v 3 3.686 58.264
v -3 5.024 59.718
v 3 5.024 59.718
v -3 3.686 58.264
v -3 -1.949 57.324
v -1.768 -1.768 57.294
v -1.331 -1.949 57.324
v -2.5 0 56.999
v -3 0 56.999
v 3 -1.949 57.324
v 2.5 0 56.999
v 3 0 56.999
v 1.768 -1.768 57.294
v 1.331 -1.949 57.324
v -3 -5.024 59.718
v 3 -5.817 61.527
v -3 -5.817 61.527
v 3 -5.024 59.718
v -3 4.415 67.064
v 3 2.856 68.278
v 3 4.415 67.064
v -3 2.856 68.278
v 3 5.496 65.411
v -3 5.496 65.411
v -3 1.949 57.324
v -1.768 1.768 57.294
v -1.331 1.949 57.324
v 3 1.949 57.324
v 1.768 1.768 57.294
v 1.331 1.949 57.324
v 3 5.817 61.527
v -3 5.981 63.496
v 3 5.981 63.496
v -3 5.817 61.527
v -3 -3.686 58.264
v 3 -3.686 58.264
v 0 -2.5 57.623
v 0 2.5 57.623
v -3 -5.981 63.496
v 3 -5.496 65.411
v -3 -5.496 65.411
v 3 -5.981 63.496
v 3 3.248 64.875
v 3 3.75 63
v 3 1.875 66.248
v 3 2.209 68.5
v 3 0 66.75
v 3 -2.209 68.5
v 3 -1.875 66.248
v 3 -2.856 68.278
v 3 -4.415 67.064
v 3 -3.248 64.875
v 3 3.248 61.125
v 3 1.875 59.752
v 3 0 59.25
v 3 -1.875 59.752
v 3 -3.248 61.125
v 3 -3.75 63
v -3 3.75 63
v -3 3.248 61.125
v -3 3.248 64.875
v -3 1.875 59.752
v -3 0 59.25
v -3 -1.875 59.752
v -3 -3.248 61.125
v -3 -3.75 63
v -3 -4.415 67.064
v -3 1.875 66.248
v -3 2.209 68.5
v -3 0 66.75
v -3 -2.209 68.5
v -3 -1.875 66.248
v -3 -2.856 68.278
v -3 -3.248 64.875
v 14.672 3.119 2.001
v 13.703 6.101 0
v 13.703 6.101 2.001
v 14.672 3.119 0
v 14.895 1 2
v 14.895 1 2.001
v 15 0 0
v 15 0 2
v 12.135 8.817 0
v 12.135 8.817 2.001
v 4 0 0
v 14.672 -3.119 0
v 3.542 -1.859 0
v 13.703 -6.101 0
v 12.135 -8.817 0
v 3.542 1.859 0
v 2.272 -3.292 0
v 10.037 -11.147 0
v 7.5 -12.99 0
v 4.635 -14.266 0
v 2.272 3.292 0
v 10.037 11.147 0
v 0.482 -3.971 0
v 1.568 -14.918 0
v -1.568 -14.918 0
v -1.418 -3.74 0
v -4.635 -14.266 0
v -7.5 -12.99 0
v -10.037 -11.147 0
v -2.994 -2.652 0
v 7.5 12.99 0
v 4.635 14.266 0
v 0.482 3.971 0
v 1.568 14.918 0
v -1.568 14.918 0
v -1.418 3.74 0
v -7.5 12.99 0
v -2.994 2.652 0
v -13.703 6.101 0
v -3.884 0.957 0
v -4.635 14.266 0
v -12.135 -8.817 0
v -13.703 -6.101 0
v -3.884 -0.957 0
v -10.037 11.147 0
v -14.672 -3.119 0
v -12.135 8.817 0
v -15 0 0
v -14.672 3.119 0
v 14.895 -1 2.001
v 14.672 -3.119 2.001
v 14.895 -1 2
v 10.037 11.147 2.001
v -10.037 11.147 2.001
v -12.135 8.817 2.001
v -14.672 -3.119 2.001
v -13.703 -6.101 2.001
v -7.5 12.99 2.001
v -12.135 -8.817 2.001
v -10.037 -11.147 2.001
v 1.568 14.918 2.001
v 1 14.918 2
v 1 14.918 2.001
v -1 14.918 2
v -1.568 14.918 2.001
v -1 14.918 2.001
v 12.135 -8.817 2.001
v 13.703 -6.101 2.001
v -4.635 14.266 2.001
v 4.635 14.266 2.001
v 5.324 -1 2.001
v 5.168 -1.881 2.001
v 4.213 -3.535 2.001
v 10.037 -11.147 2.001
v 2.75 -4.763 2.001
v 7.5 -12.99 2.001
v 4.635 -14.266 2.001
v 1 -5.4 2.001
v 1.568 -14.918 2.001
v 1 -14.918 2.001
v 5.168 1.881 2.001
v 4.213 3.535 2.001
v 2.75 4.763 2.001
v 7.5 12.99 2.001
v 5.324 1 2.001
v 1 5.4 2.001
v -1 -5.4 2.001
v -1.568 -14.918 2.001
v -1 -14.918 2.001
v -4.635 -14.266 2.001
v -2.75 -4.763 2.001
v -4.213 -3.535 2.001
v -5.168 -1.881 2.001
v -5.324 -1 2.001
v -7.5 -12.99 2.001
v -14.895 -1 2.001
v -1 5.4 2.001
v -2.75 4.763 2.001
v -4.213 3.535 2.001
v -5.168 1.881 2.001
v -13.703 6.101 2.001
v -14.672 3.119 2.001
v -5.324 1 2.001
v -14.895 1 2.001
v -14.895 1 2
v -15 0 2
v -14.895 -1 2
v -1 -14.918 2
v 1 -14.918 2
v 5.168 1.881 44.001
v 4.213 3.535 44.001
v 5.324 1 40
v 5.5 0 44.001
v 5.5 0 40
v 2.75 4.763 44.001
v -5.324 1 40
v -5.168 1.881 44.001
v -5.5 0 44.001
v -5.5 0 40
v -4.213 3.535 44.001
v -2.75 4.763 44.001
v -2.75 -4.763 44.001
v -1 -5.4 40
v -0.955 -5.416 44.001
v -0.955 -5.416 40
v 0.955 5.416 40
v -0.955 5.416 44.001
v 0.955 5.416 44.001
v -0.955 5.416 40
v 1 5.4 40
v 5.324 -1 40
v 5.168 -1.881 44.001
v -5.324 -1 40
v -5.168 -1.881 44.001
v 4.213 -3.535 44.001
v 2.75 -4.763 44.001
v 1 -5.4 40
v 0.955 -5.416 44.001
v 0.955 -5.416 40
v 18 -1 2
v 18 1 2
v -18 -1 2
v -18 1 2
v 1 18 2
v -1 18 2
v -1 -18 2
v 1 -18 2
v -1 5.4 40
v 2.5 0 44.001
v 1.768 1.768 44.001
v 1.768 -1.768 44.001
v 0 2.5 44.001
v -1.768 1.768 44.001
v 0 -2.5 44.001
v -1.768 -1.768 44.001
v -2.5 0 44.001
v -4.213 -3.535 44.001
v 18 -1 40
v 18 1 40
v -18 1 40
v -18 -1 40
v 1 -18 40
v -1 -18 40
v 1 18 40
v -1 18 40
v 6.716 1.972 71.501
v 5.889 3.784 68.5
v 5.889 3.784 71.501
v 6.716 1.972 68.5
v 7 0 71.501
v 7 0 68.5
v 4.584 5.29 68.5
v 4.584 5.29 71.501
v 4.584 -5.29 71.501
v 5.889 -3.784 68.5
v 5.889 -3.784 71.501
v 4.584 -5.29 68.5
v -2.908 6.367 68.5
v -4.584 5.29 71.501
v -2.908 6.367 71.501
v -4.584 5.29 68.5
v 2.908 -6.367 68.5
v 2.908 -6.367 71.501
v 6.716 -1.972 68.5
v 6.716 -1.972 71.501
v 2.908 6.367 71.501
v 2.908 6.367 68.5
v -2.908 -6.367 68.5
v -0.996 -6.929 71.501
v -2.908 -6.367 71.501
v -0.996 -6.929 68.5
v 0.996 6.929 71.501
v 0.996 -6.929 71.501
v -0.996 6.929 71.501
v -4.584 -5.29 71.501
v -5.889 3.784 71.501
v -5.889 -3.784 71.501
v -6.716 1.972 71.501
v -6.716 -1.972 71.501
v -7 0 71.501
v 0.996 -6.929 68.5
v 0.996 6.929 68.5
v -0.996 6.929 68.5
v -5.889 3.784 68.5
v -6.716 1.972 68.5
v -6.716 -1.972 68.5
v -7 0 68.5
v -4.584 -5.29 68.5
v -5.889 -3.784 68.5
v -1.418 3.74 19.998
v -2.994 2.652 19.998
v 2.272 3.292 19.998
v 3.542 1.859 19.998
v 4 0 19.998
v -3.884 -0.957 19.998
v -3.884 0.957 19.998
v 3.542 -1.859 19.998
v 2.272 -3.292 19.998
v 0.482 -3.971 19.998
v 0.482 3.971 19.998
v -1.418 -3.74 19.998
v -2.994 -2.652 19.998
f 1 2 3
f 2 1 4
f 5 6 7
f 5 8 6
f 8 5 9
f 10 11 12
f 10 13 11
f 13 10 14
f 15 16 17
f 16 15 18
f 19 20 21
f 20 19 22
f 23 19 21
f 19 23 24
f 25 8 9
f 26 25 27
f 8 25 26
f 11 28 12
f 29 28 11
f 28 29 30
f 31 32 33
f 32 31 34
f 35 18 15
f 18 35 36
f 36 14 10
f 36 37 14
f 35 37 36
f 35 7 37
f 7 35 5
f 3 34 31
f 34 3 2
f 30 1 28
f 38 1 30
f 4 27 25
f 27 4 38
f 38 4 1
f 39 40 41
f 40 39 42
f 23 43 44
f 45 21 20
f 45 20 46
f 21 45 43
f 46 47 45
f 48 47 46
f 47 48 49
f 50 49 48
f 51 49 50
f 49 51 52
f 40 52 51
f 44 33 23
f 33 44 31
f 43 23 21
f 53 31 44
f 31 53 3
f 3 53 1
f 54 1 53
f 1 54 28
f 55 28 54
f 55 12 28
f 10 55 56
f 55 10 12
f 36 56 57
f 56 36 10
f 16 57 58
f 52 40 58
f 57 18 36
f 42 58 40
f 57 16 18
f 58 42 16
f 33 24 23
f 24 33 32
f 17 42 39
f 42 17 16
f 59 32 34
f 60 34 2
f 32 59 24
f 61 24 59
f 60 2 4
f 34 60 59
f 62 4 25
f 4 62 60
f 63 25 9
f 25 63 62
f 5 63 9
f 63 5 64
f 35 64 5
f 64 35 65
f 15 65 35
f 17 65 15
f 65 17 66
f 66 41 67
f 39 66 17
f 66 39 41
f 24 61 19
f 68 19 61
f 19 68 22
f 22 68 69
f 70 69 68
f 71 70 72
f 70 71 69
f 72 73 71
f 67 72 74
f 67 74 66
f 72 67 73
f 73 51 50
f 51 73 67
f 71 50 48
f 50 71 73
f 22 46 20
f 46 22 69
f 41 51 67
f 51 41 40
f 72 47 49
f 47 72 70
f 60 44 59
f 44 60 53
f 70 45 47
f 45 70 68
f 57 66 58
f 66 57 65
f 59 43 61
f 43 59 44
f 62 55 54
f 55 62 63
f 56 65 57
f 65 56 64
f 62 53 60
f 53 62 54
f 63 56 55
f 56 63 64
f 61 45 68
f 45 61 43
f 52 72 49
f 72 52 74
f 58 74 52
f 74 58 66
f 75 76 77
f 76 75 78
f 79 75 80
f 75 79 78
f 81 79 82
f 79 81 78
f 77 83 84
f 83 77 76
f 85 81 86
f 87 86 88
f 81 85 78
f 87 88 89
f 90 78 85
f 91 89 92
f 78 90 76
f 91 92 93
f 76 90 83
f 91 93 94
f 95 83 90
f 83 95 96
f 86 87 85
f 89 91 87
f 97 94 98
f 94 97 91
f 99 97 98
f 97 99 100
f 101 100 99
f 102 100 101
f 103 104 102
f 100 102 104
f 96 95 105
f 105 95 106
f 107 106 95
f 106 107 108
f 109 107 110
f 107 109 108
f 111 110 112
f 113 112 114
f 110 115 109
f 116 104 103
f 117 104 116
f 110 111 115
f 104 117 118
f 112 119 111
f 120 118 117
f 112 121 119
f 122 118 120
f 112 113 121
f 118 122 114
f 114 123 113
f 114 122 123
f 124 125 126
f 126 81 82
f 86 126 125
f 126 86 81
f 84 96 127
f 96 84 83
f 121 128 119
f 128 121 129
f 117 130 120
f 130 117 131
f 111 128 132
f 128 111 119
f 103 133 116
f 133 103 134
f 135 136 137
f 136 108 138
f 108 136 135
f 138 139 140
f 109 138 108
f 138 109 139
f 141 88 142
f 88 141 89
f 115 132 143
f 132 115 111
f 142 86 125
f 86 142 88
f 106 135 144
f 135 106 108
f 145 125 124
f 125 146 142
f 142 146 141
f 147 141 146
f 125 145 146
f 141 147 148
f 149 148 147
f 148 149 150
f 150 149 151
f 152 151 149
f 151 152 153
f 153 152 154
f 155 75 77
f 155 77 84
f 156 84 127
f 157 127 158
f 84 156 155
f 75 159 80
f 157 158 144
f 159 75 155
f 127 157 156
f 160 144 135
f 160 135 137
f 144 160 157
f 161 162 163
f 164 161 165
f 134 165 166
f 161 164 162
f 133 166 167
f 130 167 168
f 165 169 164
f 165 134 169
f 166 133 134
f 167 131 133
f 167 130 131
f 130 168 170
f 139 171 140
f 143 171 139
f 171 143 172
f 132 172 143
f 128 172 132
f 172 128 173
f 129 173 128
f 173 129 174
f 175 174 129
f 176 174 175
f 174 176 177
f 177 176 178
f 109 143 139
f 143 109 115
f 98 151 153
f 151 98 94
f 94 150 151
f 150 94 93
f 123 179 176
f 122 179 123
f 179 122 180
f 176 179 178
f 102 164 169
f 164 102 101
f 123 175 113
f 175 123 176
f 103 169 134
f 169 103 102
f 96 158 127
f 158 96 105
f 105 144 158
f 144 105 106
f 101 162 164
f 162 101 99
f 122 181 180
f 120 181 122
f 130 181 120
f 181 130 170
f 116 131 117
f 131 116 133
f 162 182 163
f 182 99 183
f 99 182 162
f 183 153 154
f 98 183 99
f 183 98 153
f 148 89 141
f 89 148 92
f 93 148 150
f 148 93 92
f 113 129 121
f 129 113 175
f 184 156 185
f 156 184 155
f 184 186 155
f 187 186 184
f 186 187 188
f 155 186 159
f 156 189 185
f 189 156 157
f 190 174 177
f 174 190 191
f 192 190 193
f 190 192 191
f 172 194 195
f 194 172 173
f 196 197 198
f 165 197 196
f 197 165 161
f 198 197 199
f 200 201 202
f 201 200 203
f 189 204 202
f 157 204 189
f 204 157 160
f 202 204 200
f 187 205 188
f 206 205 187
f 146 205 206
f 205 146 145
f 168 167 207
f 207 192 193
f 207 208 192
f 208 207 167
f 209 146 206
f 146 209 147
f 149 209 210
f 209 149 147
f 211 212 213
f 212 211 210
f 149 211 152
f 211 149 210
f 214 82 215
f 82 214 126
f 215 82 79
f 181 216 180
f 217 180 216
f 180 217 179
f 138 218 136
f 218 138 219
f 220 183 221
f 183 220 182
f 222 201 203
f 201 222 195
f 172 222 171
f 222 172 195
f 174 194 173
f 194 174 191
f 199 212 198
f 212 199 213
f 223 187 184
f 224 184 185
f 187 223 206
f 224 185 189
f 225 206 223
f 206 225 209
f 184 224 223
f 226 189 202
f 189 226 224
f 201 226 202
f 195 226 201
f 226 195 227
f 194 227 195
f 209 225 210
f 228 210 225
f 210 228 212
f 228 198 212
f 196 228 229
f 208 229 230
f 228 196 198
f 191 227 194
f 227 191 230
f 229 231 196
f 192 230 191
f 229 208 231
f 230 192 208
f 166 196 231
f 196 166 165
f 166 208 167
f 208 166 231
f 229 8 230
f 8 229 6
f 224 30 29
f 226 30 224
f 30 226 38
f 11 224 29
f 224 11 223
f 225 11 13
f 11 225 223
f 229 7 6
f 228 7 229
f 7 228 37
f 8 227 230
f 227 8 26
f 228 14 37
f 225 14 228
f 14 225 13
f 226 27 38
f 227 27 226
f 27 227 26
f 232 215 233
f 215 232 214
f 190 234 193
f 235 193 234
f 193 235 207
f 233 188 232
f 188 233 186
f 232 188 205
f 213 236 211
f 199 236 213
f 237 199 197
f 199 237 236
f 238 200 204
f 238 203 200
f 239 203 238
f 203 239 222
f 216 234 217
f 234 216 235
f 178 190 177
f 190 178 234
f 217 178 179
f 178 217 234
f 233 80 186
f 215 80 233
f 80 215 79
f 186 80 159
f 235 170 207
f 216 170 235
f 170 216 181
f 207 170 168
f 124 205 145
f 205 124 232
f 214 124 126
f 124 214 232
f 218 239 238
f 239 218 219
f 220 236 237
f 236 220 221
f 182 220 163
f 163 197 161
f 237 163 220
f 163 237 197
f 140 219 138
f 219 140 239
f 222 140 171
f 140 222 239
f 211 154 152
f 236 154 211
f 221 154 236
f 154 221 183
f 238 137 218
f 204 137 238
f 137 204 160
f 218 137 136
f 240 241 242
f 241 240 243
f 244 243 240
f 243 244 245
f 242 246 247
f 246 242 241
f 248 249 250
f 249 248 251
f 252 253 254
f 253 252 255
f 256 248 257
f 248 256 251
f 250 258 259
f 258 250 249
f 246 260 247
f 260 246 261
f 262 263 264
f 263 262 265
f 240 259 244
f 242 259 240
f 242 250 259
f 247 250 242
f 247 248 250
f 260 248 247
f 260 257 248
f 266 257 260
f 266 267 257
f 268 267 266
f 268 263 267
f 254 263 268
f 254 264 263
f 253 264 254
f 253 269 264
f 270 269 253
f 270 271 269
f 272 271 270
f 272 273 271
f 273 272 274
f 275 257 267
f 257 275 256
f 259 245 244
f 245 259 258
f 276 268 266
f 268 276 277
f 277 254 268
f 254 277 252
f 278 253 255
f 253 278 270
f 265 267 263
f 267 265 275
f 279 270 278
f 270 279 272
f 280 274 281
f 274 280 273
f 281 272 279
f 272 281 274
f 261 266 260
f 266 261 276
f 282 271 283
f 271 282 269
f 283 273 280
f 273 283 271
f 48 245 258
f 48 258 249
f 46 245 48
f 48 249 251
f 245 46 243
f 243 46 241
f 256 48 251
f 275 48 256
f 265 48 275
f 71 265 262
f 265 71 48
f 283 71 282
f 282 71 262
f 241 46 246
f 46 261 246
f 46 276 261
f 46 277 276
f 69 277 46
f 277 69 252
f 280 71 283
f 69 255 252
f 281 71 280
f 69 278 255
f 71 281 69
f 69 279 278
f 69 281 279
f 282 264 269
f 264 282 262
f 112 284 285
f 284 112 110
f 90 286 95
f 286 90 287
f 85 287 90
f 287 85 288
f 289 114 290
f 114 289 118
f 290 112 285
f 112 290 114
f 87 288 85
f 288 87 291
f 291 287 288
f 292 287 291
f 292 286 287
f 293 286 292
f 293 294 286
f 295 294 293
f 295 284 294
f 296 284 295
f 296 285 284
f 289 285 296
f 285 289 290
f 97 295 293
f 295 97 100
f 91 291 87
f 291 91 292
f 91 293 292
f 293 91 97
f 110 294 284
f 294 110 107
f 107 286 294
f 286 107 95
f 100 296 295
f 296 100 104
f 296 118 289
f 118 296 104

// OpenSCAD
difference() {
    union() {
        cylinder(h=2.001, r=15);
        translate([0,0,2])
            cylinder(h=42.001, r=5.5);
        translate([0,0,44])
            cylinder(h=14.001, r=2.5);
        translate([0,0,21])
            cube([36,2,38], center=true);
        translate([0,0,21])
            rotate([0,0,90])
                cube([36,2,38], center=true);
        difference() {
            translate([-3,0,0])
                rotate([0,90,0])
                    translate([-63,0,0])
                        cylinder(h=6, r=6.001);
            translate([-4,0,0])
                rotate([0,90,0])
                    translate([-63,0,0])
                        cylinder(h=8, r=3.75);
        }
        translate([0,0,68.5])
            cylinder(h=3.001,r=7);
    };
    translate([0,0,-0.002])
        cylinder(h=20, r=4);
}
